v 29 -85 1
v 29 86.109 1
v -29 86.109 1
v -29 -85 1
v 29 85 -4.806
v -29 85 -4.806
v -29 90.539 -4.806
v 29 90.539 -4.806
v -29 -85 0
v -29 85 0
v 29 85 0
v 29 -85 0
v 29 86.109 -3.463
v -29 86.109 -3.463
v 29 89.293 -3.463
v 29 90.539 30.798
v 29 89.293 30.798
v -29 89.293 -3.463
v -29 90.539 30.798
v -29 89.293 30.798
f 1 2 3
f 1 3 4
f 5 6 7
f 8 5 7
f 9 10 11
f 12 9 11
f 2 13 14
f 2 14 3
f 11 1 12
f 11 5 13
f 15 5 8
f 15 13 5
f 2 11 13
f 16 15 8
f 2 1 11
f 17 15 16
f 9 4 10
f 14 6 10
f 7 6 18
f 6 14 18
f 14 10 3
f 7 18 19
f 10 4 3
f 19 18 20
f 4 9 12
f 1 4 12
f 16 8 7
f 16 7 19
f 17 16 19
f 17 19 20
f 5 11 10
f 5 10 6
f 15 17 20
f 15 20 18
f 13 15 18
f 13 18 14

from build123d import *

# Parameters (mm, degrees)
F0_W     = 58
F0_H     = 170
F1_DEPTH = 1
F3_DEPTH = 58


with BuildPart() as f1:
    # F0 (on Top) → F1 (new body)
    with BuildSketch(Plane.XY):
        Rectangle(F0_W, F0_H)
    extrude(amount=F1_DEPTH)

    # F2 (on face) → F3 (join, through all)
    with BuildSketch(Plane.YZ.offset(29)):
        Polygon((86.109489, 1), (85, 1), (85, -4.806199), (86.109489, -4.806199), (90.539046, -4.806199), (90.539046, -3.463339), (90.539046, 30.797509), (89.292906, 30.797509), (89.292906, -3.463339), (86.109489, -3.463339), align=None)
    extrude(amount=-F3_DEPTH)


solid = f1.part
